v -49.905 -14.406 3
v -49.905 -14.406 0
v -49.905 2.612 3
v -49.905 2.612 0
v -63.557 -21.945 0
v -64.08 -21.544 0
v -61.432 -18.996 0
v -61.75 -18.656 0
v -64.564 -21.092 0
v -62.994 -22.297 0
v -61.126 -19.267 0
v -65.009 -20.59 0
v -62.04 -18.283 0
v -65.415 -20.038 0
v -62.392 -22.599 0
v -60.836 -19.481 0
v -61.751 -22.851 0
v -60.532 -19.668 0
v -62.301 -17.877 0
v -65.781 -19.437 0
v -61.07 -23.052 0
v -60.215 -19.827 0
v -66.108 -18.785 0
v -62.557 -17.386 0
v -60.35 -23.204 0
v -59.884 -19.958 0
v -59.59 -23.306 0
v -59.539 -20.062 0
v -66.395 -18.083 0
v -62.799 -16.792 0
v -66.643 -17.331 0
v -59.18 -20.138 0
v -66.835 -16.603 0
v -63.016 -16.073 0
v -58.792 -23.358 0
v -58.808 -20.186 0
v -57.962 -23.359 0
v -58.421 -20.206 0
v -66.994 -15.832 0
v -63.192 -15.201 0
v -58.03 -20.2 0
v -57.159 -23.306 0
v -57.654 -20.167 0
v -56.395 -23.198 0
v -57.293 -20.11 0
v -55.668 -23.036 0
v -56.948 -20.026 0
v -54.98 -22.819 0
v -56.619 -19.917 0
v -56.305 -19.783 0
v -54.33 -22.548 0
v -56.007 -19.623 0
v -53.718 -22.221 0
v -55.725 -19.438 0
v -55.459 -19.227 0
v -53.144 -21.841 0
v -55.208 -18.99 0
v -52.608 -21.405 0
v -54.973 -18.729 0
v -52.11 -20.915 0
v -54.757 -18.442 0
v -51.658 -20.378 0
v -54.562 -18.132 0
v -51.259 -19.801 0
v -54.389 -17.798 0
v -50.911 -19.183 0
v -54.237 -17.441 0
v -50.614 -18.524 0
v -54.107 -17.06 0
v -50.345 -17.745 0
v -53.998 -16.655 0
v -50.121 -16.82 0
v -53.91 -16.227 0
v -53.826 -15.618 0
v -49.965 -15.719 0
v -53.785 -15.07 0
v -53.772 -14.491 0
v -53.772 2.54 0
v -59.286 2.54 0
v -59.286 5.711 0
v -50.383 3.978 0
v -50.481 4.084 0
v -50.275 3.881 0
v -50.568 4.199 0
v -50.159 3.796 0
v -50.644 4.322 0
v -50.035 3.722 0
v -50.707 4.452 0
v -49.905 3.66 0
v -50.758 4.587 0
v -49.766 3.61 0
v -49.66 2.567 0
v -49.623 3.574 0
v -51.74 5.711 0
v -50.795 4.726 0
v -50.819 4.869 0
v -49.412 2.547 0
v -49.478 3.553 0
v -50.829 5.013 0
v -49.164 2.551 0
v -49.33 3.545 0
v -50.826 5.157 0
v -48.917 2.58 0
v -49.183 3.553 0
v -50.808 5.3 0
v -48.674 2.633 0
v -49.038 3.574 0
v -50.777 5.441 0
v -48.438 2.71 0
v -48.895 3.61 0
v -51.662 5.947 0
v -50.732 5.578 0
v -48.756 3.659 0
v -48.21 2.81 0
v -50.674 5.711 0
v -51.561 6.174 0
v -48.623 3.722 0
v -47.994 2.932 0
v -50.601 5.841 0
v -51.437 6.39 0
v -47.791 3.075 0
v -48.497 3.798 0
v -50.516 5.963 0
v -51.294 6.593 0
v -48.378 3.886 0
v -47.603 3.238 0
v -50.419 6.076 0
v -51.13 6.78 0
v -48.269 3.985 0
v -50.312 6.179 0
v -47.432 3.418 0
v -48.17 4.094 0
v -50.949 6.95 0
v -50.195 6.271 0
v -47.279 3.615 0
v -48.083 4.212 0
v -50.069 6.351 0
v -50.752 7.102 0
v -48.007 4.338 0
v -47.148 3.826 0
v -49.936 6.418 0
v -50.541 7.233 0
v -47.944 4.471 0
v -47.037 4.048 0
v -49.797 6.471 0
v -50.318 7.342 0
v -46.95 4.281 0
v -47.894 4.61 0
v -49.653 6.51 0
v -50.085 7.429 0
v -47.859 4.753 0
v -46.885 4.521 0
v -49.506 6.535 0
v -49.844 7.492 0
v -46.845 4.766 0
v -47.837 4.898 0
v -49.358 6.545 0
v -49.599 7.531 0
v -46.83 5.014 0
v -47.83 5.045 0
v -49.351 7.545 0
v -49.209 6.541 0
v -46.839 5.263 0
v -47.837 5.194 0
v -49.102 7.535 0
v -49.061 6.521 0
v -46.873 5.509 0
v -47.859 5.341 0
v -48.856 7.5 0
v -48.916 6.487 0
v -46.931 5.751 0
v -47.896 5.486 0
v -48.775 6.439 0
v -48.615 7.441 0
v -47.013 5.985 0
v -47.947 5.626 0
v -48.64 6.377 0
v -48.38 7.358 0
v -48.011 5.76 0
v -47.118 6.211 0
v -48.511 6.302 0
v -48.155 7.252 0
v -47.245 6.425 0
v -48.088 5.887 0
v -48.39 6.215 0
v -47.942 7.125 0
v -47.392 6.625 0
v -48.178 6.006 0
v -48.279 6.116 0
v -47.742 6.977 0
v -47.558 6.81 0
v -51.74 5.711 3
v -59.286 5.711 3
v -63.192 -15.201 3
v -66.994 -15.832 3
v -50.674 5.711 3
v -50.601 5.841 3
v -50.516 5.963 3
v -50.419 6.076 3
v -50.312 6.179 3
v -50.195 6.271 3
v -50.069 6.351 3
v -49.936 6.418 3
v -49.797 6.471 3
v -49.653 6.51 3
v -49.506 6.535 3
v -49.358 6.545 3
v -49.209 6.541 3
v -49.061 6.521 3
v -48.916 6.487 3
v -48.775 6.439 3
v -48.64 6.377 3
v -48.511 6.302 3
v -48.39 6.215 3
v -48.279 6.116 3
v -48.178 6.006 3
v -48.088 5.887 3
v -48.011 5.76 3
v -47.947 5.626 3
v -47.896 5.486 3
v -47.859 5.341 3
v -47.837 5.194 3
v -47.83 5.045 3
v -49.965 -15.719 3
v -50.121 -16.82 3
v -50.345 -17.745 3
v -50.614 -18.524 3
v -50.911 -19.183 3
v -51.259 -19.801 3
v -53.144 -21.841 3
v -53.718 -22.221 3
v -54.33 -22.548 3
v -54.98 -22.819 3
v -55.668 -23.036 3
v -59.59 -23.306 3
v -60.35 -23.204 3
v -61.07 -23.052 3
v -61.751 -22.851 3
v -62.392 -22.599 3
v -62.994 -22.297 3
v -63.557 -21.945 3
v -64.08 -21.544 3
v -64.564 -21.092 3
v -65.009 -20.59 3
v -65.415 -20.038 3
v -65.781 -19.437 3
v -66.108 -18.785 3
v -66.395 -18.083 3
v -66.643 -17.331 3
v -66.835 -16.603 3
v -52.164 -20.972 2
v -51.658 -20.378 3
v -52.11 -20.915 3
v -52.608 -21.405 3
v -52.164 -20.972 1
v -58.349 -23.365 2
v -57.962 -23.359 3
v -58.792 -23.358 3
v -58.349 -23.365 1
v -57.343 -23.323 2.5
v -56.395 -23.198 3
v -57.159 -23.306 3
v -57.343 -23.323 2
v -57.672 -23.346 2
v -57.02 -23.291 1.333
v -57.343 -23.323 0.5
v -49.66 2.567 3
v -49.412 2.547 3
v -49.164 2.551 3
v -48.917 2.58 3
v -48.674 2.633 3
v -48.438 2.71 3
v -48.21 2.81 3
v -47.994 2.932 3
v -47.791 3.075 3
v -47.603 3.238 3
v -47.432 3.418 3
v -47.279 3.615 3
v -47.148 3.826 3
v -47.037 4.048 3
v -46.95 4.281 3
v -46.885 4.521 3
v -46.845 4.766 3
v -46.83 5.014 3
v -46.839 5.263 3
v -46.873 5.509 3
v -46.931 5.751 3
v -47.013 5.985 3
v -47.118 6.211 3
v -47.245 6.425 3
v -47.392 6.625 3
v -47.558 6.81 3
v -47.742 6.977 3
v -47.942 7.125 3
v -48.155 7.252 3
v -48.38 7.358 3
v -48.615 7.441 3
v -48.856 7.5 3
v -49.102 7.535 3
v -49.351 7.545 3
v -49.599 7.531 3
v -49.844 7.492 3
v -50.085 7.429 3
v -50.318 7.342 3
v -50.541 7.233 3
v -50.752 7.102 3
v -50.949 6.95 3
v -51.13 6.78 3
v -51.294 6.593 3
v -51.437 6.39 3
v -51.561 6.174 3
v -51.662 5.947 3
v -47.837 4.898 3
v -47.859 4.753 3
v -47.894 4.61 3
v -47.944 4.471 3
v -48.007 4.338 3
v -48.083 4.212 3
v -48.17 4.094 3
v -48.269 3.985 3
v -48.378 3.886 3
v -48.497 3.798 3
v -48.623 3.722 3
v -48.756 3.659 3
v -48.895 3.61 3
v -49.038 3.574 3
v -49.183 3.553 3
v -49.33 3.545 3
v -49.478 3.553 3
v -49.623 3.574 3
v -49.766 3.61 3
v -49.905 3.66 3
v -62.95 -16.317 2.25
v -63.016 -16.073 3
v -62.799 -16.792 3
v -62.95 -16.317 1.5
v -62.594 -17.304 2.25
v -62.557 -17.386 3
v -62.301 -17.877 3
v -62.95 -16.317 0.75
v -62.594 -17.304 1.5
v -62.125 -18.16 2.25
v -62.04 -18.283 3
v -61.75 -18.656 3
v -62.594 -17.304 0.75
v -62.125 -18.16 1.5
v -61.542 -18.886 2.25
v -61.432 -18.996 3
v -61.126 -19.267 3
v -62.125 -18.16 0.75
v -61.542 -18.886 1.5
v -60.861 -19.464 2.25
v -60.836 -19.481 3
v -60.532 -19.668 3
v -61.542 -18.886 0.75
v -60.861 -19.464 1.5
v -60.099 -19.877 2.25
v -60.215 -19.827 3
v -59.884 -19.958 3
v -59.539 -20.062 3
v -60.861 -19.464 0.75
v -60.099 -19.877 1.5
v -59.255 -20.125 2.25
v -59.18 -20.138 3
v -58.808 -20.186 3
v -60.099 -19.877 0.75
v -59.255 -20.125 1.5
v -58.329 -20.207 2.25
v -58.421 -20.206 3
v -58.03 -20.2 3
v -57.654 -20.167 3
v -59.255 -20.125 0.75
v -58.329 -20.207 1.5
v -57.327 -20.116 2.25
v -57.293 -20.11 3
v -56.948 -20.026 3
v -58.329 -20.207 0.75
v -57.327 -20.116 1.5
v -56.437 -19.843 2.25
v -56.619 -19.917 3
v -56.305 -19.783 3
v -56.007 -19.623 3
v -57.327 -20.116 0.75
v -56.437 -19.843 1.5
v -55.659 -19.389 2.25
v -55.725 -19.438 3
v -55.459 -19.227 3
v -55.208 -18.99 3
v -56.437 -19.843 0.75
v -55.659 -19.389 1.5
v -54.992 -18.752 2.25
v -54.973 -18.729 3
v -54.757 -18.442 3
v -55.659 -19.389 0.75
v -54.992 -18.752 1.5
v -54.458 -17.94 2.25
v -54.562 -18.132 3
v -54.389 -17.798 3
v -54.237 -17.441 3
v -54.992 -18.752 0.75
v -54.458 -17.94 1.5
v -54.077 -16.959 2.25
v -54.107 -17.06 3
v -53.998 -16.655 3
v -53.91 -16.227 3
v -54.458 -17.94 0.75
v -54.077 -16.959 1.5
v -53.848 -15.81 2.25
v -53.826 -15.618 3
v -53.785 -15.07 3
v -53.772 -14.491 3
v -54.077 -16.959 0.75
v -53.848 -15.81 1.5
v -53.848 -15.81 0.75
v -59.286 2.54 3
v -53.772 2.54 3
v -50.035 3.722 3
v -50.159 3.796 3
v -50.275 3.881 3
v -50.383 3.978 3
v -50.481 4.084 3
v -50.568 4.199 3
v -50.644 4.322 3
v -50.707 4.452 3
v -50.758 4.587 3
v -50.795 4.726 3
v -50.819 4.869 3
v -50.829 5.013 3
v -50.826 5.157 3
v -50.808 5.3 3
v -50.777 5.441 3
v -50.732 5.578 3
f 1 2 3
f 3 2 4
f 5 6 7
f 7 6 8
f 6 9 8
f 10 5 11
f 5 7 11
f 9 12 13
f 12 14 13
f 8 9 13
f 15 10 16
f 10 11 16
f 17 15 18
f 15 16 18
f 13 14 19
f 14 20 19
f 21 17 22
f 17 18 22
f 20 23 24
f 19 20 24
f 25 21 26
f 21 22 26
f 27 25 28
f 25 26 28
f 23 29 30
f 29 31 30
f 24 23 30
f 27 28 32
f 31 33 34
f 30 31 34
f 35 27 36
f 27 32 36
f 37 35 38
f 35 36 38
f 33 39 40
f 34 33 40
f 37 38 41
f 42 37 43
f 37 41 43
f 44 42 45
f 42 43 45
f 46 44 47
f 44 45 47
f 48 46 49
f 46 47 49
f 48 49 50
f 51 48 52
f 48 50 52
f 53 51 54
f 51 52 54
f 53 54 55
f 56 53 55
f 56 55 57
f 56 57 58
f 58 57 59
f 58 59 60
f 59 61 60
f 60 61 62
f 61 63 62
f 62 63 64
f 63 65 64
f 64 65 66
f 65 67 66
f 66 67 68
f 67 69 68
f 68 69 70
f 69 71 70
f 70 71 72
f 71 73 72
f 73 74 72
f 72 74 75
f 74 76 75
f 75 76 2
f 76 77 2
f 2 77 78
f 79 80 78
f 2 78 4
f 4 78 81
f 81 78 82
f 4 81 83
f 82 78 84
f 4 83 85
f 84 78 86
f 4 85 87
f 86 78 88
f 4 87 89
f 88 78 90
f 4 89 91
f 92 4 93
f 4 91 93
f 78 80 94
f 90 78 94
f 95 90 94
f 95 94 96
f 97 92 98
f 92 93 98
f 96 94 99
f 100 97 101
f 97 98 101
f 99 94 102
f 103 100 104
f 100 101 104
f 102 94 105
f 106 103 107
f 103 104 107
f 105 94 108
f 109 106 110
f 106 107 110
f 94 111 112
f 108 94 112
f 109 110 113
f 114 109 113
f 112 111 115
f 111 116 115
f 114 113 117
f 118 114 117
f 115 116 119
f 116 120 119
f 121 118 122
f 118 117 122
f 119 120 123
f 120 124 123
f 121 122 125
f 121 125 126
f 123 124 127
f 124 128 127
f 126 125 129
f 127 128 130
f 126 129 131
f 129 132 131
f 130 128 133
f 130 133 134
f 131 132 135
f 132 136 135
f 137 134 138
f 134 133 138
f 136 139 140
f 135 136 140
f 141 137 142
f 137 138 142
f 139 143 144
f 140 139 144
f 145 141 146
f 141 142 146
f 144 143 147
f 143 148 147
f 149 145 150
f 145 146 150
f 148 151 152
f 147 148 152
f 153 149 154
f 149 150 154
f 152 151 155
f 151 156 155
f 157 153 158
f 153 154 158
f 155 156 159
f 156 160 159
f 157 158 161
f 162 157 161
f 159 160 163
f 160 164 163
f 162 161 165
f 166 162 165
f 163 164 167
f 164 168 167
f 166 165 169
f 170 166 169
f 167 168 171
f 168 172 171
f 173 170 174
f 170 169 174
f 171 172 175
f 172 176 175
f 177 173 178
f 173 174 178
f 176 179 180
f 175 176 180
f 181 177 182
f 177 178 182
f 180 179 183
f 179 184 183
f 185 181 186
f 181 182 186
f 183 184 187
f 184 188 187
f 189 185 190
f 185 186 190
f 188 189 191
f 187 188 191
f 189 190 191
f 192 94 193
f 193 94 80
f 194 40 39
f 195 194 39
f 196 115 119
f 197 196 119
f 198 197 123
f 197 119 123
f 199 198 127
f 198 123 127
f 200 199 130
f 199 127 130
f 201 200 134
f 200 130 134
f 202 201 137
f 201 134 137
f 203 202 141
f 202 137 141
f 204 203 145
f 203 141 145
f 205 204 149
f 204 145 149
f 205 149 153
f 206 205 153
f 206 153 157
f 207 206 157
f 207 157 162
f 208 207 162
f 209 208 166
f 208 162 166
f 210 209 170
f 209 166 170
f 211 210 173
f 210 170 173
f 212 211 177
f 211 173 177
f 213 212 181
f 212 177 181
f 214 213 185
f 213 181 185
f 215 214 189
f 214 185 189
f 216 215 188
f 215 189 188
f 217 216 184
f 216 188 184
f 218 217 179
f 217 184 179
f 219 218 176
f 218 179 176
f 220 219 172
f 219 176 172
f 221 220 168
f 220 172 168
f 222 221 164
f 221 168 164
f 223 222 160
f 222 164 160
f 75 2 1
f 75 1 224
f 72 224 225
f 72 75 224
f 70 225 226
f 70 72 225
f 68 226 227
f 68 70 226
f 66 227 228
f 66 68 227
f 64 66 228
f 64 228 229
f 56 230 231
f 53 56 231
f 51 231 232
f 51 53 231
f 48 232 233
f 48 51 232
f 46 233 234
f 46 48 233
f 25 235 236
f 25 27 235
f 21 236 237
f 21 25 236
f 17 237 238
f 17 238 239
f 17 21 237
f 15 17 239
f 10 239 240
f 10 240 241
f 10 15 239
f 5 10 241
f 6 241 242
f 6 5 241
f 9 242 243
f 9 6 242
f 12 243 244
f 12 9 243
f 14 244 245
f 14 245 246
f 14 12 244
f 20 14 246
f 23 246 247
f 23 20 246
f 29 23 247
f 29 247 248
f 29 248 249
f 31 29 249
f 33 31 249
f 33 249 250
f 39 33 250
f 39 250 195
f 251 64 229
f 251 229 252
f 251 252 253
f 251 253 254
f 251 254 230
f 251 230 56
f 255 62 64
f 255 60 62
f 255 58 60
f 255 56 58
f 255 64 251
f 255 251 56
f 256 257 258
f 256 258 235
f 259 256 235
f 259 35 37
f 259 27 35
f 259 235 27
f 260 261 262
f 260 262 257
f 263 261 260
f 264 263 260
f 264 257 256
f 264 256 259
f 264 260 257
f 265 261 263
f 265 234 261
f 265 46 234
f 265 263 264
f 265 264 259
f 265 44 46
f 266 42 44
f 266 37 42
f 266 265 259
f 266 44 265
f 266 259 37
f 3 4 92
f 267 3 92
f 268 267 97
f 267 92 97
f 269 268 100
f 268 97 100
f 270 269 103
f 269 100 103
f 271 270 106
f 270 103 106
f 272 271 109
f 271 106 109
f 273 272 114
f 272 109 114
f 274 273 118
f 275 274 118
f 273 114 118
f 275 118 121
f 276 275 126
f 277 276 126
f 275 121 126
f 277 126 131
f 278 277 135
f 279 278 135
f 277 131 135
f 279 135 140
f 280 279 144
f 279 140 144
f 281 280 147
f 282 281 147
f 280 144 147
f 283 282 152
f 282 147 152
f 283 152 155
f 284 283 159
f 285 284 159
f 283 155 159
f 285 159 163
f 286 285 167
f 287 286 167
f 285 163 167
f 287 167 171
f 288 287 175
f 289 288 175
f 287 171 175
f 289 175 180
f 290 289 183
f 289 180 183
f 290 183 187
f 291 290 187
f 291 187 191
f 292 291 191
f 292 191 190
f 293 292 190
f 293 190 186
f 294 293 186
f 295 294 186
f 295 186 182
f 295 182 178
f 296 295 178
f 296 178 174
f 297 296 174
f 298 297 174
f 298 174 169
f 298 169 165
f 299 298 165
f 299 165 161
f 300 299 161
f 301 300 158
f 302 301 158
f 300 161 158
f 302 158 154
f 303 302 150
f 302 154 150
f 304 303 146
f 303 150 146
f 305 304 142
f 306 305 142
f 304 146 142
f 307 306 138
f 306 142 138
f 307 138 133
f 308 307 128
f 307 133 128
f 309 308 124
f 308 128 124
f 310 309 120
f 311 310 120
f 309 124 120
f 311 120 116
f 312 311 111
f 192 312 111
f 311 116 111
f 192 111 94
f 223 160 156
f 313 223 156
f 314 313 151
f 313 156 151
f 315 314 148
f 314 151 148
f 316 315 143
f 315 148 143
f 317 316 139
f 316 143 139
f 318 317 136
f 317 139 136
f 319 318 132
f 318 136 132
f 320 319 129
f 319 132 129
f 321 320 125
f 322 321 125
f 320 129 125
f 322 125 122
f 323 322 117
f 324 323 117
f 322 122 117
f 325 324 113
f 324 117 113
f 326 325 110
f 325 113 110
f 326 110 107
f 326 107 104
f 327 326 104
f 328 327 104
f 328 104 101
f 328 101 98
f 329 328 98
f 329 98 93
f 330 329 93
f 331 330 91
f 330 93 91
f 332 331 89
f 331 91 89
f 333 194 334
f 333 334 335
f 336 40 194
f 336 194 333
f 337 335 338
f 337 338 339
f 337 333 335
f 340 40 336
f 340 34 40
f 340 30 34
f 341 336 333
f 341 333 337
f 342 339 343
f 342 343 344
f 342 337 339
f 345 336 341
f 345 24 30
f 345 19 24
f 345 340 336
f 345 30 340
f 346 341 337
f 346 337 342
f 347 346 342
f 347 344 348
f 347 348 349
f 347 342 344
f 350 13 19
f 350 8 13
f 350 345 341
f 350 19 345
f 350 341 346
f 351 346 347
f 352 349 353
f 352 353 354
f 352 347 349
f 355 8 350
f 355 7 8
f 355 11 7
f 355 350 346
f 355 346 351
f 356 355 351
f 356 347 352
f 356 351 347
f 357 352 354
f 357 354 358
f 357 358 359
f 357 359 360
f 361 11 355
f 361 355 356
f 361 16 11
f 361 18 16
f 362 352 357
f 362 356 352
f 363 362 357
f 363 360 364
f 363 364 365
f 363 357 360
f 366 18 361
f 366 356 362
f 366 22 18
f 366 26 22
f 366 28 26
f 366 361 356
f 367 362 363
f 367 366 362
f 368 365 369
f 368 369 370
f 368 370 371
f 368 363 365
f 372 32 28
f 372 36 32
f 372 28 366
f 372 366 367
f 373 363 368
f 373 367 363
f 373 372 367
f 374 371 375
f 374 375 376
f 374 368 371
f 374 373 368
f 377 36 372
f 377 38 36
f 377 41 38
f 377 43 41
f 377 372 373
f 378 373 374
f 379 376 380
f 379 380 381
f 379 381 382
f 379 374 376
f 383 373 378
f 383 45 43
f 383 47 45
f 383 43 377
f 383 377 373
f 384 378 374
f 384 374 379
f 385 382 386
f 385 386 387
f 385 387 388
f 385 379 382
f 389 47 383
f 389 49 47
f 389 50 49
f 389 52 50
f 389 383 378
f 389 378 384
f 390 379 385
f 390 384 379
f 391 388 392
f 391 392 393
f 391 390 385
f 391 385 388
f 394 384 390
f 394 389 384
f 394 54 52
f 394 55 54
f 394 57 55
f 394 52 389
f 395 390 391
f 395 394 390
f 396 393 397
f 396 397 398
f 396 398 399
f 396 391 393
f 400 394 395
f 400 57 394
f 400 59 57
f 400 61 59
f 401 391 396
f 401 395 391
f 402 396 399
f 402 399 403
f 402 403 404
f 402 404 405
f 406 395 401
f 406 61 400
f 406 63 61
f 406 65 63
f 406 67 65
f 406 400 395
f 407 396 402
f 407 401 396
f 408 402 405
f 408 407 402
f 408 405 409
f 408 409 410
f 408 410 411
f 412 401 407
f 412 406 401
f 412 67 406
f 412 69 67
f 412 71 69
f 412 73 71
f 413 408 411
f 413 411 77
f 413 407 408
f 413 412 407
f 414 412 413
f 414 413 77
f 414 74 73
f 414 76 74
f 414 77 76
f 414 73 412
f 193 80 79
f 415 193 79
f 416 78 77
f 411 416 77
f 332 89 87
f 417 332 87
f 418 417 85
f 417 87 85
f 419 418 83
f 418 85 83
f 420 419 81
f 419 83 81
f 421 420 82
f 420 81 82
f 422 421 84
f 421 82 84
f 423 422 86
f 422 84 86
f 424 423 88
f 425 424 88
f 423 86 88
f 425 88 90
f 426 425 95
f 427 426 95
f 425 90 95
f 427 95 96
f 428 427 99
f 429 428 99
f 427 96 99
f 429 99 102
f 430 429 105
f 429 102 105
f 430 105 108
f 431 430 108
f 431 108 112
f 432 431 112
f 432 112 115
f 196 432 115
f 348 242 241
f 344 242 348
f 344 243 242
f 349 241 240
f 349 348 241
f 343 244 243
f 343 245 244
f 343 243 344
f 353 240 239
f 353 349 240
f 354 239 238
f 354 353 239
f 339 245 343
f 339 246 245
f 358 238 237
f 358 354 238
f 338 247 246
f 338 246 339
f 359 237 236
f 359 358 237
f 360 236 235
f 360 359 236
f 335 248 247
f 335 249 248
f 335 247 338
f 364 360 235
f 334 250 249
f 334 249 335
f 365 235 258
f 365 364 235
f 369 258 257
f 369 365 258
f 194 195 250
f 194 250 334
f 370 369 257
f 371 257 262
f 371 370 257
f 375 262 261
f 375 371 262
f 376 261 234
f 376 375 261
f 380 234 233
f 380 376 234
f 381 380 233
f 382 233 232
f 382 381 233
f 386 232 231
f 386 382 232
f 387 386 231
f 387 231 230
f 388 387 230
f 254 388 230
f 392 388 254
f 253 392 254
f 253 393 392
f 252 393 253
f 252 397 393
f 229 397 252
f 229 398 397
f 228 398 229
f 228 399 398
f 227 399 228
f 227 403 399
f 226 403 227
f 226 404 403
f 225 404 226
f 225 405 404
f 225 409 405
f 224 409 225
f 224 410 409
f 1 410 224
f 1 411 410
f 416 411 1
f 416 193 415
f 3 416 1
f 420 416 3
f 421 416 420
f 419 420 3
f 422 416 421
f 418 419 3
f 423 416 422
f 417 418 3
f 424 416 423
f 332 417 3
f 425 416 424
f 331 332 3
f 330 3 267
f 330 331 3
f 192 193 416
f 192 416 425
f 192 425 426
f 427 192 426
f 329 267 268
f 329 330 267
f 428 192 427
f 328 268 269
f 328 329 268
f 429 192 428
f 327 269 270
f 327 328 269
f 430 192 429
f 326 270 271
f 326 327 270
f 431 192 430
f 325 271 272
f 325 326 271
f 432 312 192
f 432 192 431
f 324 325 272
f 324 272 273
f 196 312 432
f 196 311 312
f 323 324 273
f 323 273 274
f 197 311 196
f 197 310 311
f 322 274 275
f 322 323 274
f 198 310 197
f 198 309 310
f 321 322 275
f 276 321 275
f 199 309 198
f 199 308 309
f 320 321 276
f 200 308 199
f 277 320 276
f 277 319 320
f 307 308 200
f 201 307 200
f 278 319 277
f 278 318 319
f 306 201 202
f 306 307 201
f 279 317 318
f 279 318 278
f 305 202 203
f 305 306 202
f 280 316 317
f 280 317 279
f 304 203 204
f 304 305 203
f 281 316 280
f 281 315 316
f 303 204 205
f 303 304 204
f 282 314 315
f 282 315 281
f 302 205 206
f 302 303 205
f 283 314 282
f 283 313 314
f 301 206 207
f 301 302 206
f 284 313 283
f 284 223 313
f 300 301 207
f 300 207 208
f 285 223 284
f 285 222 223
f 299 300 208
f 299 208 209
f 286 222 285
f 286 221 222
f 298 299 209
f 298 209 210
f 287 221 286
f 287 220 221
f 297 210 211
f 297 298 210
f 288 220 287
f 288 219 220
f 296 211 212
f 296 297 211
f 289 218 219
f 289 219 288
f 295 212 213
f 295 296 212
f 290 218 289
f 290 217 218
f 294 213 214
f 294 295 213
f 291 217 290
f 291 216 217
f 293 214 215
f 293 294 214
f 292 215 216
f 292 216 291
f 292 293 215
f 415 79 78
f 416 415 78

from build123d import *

# Parameters (mm, degrees)
F1_DEPTH = 3


with BuildPart() as f1:
    # F0 (on Top) → F1 (new body)
    with BuildSketch(Plane.XY):
        with BuildLine():
            ThreePointArc((-50.6740901919, 5.7108190317), (-48.9880719662, 6.5060249327), (-47.8297353387, 5.0454544483))
            ThreePointArc((-47.8297353387, 5.0454544483), (-48.4967601552, 3.7979960948), (-49.9046051304, 3.6599853138))
            Line((-49.9046051304, 3.6599853138), (-49.9046051304, 2.6124471071))
            ThreePointArc((-49.9046051304, 2.6124471071), (-47.7784736714, 3.084947565), (-46.8297353387, 5.0454544483))
            ThreePointArc((-46.8297353387, 5.0454544483), (-48.9940121238, 7.5228098776), (-51.7395672771, 5.7108190317))
            Line((-51.7395672771, 5.7108190317), (-50.6740901919, 5.7108190317))
        make_face()
        with BuildLine():
            ThreePointArc((-49.9046051304, 3.6599853138), (-50.7341339801, 4.518515689), (-50.6740901919, 5.7108190317))
            Line((-50.6740901919, 5.7108190317), (-51.7395672771, 5.7108190317))
            ThreePointArc((-51.7395672771, 5.7108190317), (-51.4808021089, 3.7715189123), (-49.9046051304, 2.6124471071))
            Line((-49.9046051304, 2.6124471071), (-49.9046051304, 3.6599853138))
        make_face()
        with BuildLine():
            ThreePointArc((-49.9046051304, 2.6124471071), (-51.4808021089, 3.7715189123), (-51.7395672771, 5.7108190317))
            Line((-51.7395672771, 5.7108190317), (-59.286115547, 5.7108190317))
            Line((-59.286115547, 5.7108190317), (-59.286115547, 2.540246115))
            Line((-59.286115547, 2.540246115), (-53.7717926304, 2.540246115))
            Line((-53.7717926304, 2.540246115), (-53.7717926304, -14.491003885))
            add(Edge.make_bspline(
                [(-54.9924957554, -18.7520715933), (-53.7717926304, -17.2969934683), (-53.7717926304, -14.491003885)],
                knots=[0, 0, 0, 1, 1, 1], degree=2))
            add(Edge.make_bspline(
                [(-58.329084297, -20.2071497183), (-56.2131988804, -20.2071497183), (-54.9924957554, -18.7520715933)],
                knots=[0, 0, 0, 1, 1, 1], degree=2))
            add(Edge.make_bspline(
                [(-61.541974922, -18.885535135), (-60.262678047, -20.2071497183), (-58.329084297, -20.2071497183)],
                knots=[0, 0, 0, 1, 1, 1], degree=2))
            add(Edge.make_bspline(
                [(-63.192365547, -15.2006393017), (-62.821271797, -17.5639205517), (-61.541974922, -18.885535135)],
                knots=[0, 0, 0, 1, 1, 1], degree=2))
            Line((-63.192365547, -15.2006393017), (-66.9944488804, -15.8321497183))
            add(Edge.make_bspline(
                [(-58.348615547, -23.3647018017), (-65.633771797, -23.3647018017), (-66.9944488804, -15.8321497183)],
                knots=[0, 0, 0, 1, 1, 1], degree=2))
            add(Edge.make_bspline(
                [(-52.1637197137, -20.9721236767), (-54.422834297, -23.3647018017), (-58.348615547, -23.3647018017)],
                knots=[0, 0, 0, 1, 1, 1], degree=2))
            add(Edge.make_bspline(
                [(-49.9046051304, -14.4063684683), (-49.9046051304, -18.5795455517), (-52.1637197137, -20.9721236767)],
                knots=[0, 0, 0, 1, 1, 1], degree=2))
            Line((-49.9046051304, -14.4063684683), (-49.9046051304, 2.6124471071))
        make_face()
    extrude(amount=F1_DEPTH)


solid = f1.part
